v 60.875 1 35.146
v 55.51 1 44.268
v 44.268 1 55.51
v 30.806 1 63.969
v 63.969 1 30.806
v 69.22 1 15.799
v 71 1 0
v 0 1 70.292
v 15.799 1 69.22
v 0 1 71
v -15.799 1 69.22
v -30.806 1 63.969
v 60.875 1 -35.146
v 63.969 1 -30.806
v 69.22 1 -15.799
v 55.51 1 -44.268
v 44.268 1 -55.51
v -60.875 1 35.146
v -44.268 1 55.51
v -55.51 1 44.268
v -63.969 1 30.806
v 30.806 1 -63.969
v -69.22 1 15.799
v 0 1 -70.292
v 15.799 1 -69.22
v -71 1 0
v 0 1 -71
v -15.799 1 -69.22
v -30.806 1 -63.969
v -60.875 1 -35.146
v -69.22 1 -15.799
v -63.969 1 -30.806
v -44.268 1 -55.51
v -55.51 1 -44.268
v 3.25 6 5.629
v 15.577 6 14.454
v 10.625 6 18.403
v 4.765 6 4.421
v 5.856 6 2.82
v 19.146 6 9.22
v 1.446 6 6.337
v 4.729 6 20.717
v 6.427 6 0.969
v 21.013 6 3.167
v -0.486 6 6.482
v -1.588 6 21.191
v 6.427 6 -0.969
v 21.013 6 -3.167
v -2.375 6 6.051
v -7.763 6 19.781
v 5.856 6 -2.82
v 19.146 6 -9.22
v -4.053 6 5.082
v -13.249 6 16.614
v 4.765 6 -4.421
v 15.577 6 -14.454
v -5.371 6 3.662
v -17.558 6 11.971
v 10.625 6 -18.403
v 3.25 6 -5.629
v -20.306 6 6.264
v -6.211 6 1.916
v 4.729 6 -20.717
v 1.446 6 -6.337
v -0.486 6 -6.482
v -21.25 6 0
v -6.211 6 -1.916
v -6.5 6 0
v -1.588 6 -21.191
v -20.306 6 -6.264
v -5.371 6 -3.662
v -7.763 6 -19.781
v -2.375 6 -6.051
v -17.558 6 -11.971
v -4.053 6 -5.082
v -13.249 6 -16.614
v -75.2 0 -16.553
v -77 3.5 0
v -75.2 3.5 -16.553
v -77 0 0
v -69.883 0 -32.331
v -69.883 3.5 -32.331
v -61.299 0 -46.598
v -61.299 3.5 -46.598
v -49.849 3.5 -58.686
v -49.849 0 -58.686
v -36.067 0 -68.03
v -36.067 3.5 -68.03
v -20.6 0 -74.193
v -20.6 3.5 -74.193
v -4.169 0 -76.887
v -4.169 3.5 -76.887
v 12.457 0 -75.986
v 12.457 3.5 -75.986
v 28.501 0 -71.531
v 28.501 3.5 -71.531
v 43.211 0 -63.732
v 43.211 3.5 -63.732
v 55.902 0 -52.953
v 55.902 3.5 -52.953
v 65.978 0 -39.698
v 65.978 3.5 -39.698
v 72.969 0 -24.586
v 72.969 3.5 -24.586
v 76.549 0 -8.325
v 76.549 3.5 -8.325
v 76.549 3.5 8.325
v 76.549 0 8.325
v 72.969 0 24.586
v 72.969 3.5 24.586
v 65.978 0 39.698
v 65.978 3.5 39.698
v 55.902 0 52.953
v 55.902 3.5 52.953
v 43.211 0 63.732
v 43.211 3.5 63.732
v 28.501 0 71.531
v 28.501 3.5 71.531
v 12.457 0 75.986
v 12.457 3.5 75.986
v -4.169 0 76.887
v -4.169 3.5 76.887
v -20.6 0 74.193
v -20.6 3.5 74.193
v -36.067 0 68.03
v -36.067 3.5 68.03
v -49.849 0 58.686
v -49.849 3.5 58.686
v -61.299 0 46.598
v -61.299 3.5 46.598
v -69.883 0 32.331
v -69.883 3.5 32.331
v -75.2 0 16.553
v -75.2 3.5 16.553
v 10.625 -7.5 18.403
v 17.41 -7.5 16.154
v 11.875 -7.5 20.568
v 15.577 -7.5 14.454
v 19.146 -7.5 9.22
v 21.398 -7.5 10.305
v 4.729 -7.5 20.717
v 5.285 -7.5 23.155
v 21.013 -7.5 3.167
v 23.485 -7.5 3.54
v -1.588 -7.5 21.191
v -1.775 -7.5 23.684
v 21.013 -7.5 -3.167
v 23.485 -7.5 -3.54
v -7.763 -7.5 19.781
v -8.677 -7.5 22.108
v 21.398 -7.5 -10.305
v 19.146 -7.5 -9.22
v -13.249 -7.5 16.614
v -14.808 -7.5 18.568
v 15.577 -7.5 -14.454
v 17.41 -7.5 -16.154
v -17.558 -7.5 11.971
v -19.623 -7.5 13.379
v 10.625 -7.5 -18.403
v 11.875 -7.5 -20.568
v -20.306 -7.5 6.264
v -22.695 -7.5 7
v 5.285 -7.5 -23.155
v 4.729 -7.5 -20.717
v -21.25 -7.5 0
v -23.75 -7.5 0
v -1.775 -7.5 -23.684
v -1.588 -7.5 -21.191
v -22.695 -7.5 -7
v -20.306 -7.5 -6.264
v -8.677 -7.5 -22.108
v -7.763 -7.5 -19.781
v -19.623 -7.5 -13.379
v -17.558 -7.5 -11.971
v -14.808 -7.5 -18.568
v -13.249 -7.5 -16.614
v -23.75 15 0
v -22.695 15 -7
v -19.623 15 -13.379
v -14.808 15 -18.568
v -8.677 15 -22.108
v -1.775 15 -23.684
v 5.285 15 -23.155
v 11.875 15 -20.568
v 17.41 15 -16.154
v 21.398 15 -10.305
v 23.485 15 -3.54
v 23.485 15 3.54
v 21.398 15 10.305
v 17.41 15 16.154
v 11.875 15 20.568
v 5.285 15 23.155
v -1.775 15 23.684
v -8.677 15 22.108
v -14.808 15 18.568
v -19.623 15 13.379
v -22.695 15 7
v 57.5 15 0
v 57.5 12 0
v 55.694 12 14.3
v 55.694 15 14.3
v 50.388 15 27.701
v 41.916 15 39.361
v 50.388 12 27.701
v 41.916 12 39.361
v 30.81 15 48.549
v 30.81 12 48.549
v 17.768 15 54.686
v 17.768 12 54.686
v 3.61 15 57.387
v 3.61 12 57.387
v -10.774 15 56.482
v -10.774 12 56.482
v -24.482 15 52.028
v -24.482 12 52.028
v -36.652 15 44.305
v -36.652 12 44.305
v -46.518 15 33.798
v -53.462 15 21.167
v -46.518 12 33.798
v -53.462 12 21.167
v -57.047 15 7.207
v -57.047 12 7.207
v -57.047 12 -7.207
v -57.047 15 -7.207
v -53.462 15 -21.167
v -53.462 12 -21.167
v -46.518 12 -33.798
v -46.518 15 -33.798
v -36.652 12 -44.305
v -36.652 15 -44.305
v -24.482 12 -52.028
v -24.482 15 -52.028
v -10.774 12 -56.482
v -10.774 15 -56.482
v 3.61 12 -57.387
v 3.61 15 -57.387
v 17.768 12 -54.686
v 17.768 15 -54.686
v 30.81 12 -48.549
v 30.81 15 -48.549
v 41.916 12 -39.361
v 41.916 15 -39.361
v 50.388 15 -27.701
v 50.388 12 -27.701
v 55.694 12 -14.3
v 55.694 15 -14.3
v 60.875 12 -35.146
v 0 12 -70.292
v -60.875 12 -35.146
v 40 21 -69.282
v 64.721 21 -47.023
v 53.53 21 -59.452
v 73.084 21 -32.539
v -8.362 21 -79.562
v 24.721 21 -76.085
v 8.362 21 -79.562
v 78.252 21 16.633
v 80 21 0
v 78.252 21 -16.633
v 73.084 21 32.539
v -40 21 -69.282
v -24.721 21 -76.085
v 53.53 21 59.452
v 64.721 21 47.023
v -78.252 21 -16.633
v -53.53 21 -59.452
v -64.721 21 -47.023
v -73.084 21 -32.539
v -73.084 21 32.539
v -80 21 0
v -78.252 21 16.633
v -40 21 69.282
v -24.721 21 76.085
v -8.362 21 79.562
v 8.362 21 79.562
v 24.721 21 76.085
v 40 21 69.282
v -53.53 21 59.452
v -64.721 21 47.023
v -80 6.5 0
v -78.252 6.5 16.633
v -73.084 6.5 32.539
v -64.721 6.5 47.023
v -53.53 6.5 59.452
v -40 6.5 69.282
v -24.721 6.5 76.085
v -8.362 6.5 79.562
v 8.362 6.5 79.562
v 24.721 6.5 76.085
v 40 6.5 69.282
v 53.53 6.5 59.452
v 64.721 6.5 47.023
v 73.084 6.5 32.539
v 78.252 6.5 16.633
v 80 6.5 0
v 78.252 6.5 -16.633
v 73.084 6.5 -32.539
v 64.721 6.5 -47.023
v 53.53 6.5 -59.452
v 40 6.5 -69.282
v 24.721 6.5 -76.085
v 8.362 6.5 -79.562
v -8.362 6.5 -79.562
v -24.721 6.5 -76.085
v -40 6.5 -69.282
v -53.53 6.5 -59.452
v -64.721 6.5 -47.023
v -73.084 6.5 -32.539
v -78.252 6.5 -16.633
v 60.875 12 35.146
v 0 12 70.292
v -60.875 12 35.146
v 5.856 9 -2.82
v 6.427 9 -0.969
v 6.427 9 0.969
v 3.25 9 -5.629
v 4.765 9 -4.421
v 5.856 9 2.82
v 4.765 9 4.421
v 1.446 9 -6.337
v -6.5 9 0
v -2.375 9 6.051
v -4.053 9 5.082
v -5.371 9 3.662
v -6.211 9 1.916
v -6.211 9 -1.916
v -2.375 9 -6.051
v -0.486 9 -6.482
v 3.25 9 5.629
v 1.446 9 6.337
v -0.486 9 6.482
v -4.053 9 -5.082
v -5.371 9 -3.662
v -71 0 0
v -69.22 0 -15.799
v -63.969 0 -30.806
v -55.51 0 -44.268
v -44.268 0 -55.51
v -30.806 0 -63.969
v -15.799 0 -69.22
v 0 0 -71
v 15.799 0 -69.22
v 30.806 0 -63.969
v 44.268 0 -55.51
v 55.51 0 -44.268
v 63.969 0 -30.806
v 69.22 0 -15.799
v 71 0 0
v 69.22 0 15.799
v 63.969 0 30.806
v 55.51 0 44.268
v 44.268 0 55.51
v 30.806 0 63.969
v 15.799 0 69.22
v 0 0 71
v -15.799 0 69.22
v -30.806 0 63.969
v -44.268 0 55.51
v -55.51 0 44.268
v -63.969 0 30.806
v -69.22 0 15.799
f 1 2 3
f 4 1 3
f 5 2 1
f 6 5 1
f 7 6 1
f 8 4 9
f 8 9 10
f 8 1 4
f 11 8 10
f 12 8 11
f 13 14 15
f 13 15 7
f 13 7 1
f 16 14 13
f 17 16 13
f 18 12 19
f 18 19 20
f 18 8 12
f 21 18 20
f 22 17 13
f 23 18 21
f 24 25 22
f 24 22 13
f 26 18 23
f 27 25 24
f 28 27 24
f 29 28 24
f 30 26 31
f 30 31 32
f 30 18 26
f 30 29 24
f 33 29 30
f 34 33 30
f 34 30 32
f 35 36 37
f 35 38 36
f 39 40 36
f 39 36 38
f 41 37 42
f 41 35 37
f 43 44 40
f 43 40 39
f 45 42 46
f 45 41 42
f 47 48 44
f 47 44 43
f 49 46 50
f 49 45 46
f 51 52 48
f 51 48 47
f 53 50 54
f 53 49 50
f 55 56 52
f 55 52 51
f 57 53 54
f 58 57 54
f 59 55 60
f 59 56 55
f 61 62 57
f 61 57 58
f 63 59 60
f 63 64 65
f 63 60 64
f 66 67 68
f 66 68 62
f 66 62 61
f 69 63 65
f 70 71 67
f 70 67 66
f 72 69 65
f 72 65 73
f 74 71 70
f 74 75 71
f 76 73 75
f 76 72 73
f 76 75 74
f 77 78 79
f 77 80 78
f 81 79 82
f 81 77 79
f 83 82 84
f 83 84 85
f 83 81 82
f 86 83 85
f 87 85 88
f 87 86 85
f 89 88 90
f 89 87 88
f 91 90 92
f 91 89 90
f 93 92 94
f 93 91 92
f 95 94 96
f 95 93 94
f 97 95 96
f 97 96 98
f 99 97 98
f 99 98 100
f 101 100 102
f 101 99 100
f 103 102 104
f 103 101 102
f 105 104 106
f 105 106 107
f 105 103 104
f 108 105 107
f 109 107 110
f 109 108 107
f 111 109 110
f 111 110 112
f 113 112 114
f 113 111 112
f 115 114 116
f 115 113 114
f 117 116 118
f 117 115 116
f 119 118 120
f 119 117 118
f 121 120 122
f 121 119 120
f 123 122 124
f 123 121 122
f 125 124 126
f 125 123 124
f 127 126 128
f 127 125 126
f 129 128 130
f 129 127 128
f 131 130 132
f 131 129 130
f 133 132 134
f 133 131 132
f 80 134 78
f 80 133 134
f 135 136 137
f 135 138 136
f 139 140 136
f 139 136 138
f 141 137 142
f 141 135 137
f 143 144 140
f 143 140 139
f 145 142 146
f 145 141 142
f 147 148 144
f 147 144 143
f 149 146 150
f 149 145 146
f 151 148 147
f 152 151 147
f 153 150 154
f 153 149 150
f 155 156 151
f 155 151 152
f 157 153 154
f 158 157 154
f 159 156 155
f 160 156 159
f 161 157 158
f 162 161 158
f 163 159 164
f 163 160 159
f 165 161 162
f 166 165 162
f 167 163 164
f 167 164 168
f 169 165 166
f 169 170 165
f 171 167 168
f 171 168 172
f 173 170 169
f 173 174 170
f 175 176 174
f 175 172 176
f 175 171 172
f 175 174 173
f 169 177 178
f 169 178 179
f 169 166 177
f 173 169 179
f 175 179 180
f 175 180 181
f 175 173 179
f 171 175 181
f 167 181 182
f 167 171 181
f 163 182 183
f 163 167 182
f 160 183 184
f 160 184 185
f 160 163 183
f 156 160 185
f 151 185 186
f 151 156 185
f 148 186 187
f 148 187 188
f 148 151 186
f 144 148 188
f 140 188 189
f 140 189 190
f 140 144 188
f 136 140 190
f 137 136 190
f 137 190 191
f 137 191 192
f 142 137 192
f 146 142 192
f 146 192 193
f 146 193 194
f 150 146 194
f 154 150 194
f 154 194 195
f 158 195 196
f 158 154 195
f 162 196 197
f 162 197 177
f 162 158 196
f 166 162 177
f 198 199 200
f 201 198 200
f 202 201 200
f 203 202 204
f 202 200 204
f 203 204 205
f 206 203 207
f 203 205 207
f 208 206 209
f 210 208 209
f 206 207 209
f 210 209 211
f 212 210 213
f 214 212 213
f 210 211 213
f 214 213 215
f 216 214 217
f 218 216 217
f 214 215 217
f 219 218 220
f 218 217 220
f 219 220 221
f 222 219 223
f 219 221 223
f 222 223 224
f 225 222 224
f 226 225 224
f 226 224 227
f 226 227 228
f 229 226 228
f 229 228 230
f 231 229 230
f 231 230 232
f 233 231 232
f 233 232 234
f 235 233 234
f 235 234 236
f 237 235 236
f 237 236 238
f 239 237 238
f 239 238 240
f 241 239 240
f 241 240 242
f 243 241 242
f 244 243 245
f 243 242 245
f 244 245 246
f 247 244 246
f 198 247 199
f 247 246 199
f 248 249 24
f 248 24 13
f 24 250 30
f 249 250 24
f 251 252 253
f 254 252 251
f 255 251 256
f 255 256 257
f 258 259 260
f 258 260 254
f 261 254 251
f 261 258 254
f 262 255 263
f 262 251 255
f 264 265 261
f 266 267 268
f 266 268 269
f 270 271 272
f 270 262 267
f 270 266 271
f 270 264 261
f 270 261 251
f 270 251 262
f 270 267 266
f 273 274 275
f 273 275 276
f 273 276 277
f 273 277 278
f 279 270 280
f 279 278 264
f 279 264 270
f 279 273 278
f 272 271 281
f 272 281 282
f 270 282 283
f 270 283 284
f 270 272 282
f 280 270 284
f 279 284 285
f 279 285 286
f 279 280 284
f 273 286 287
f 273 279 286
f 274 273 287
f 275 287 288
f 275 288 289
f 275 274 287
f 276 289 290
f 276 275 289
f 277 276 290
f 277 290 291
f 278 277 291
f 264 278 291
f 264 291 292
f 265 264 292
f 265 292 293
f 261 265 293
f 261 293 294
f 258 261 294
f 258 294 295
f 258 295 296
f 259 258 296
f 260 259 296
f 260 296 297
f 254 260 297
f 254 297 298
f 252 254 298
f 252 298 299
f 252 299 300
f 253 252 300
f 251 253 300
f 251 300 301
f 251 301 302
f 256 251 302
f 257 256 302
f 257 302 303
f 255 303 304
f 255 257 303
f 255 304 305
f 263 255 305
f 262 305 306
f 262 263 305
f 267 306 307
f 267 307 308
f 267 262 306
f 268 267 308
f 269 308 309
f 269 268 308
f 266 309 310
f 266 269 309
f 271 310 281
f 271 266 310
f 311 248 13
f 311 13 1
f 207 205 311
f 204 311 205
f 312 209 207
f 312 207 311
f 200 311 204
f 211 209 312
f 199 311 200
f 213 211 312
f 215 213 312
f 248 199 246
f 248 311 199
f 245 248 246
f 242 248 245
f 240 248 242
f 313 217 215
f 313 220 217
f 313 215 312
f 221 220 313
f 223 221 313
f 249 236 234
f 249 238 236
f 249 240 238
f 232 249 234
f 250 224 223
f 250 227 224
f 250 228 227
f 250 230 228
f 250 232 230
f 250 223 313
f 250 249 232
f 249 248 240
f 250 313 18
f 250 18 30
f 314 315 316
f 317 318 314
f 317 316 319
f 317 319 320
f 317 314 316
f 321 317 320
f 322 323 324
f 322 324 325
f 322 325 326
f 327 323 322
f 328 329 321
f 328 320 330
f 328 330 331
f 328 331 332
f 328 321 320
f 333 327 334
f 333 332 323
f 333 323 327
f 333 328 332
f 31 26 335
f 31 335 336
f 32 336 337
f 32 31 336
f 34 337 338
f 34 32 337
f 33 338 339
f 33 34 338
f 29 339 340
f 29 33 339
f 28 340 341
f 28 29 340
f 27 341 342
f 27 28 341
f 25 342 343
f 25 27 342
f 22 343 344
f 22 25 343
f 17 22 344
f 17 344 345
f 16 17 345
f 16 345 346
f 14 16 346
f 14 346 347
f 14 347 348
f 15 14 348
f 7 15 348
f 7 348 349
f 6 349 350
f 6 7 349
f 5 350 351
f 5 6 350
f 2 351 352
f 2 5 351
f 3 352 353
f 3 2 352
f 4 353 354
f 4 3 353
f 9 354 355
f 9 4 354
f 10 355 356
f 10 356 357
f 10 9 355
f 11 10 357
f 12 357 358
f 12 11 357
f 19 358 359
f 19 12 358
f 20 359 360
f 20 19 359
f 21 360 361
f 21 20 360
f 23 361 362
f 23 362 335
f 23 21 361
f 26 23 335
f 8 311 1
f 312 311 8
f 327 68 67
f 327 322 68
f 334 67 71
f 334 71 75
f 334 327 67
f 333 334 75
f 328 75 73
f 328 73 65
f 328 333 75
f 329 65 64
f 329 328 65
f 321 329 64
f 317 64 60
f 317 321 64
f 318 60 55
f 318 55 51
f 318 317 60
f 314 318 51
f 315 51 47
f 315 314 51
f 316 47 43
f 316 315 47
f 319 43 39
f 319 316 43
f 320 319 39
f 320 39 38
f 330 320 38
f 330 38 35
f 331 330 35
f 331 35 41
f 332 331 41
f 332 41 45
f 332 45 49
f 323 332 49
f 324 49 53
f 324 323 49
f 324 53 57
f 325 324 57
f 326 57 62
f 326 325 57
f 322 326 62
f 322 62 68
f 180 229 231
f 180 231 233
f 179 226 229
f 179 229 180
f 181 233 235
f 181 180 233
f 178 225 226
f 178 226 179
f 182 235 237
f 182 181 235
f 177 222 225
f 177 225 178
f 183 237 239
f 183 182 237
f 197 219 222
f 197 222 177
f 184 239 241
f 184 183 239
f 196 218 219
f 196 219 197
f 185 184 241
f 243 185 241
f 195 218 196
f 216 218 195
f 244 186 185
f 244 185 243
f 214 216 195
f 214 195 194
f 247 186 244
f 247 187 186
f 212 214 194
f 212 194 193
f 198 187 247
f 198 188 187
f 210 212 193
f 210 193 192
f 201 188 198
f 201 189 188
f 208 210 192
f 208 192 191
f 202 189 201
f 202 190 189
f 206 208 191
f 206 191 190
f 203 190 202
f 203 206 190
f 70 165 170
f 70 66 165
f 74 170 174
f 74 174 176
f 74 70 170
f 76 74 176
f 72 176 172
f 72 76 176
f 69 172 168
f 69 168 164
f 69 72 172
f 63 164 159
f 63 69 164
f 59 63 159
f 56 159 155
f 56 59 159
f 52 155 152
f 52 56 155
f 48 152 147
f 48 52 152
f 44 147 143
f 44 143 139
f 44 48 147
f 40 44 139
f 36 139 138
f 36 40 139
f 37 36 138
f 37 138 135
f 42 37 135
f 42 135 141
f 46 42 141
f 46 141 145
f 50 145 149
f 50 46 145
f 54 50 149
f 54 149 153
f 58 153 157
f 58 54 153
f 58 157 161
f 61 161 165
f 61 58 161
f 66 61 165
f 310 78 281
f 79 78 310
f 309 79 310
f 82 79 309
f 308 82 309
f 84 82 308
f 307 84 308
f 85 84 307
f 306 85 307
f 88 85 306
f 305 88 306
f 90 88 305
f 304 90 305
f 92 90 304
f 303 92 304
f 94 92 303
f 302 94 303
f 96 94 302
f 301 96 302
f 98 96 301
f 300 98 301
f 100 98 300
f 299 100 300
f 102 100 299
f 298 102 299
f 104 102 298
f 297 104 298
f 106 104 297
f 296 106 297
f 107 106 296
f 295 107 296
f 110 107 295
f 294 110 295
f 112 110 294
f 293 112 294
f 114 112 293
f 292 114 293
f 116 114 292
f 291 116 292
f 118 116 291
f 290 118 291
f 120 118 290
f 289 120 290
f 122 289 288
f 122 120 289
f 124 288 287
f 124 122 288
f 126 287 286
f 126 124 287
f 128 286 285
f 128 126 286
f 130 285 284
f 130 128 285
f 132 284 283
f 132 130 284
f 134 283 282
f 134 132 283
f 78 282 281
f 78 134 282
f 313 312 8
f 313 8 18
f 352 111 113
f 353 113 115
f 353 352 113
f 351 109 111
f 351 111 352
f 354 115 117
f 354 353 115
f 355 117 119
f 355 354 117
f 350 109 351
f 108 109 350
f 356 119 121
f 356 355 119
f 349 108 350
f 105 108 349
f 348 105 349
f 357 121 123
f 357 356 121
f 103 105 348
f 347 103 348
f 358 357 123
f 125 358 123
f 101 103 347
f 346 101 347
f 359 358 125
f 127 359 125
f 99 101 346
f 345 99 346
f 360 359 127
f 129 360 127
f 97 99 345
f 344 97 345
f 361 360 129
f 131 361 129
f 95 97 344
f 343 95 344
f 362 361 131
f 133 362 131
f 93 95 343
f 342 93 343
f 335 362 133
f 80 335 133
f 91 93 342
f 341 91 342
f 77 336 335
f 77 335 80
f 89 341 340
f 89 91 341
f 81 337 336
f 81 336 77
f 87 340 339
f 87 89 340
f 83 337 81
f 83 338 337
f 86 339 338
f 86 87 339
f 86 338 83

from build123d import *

# Parameters (mm, degrees)
SKETCH2_R            = 71
BOSS_EXTRUDE1_DEPTH  = 11
SKETCH12_R           = 57.5
SKETCH12_R_2         = 23.75
CUT_EXTRUDE8_DEPTH   = 1
CUT_EXTRUDE9_START   = -10
SKETCH10_R           = 85
SKETCH10_R_2         = 81
CUT_EXTRUDE9_DEPTH   = 10
SKETCH14_R           = 57.5
SKETCH14_R_2         = 23.75
BOSS_EXTRUDE2_DEPTH  = 1
SKETCH15_R           = 81
BOSS_EXTRUDE3_DEPTH  = 4
SKETCH16_R           = 57.5
SKETCH16_R_2         = 23.75
CUT_EXTRUDE11_DEPTH  = 2
SKETCH17_W           = 29
SKETCH17_H           = 10.11
SKETCH17_H_2         = 35.11
BOSS_EXTRUDE4_DEPTH  = 3
SKETCH19_R           = 80.970867582
BOSS_EXTRUDE5_DEPTH  = 2
BOSS_EXTRUDE6_START  = -3
SKETCH20_R           = 80.970867582
BOSS_EXTRUDE6_DEPTH  = 3
SKETCH21_W           = 29
SKETCH21_H           = 45.22
BOSS_EXTRUDE7_DEPTH  = 4
BOSS_EXTRUDE9_DEPTH  = 5
CUT_EXTRUDE12_START  = -5
SKETCH26_R           = 80.970867582
CUT_EXTRUDE12_DEPTH  = 5
BOSS_EXTRUDE10_START = -4
SKETCH27_R           = 80.970867582
BOSS_EXTRUDE10_DEPTH = 4
CUT_EXTRUDE15_REACH  = 120.043
SKETCH28_R           = 80.970867582
SKETCH28_R_2         = 80


with BuildPart() as part:
    # Sketch1 → Revolve1 (revolve)
    with BuildSketch(Plane.XY, mode=Mode.PRIVATE) as revolve1_sk:
        Polygon((0, 12), (0, 15), (85, 15), (85, 10.5), (84, 10.5), (77, 3.5), (77, 0), (71, 0), (71, 12), (23.75, 12), (23.75, -7.5), (21.25, -7.5), (21.25, 6), (6.5, 6), (6.5, 9), (0, 9), align=None)
    revolve(revolve1_sk.sketch.rotate(Axis((0, 12, 0), (0, -1, 0)), 180), axis=Axis((0, 12, 0), (0, -1, 0)))

    # Sketch2 → Boss-Extrude1 (add)
    with BuildSketch(Plane.XZ.offset(-12)):
        with Locations(Location((0, 0, 0), (0, 0, 180))):
            Circle(SKETCH2_R)
        Polygon((0, 70.292395274), (-60.875, 35.146197637), (-60.875, -35.146197637), (0, -70.292395274), (60.875, -35.146197637), (60.875, 35.146197637), align=None, mode=Mode.SUBTRACT)
    extrude(amount=BOSS_EXTRUDE1_DEPTH)

    # Sketch12 → Cut-Extrude8 (cut)
    with BuildSketch(Plane.XZ.offset(-12)):
        Circle(SKETCH12_R)
        with Locations(Location((0, 0, 0), (0, 0, 180))):
            Circle(SKETCH12_R_2, mode=Mode.SUBTRACT)
    extrude(amount=-CUT_EXTRUDE8_DEPTH, mode=Mode.SUBTRACT)

    # Sketch10 → Cut-Extrude9 (cut)
    with BuildSketch(Plane(origin=(0, 15, 0), x_dir=(1, 0, 0), z_dir=(0, 1, 0)).offset(CUT_EXTRUDE9_START)):
        Circle(SKETCH10_R)
        with Locations(Location((0, 0, 0), (0, 0, 180))):
            Circle(SKETCH10_R_2, mode=Mode.SUBTRACT)
    extrude(amount=CUT_EXTRUDE9_DEPTH, mode=Mode.SUBTRACT)

    # Sketch14 → Boss-Extrude2 (add)
    with BuildSketch(Plane(origin=(0, 13, 0), x_dir=(-1, 0, 0), z_dir=(0, -1, 0))):
        with Locations(Location((0, 0, 0), (0, 0, 180))):
            Circle(SKETCH14_R)
        Circle(SKETCH14_R_2, mode=Mode.SUBTRACT)
    extrude(amount=-BOSS_EXTRUDE2_DEPTH)

    # Sketch15 → Boss-Extrude3 (add)
    with BuildSketch(Plane(origin=(0, 15, 0), x_dir=(1, 0, 0), z_dir=(0, 1, 0))):
        with Locations(Location((0, 0, 0), (0, 0, 180))):
            Circle(SKETCH15_R)
    extrude(amount=BOSS_EXTRUDE3_DEPTH)

    # Sketch16 → Cut-Extrude11 (cut)
    with BuildSketch(Plane.XZ.offset(-13)):
        Circle(SKETCH16_R)
        with Locations(Location((0, 0, 0), (0, 0, 180))):
            Circle(SKETCH16_R_2, mode=Mode.SUBTRACT)
    extrude(amount=-CUT_EXTRUDE11_DEPTH, mode=Mode.SUBTRACT)

    # Sketch17 → Boss-Extrude4 (add)
    with BuildSketch(Plane(origin=(0, 19, 0), x_dir=(1, 0, 0), z_dir=(0, 1, 0))):
        with Locations((-48.833648901, -5.055)):
            Rectangle(SKETCH17_W, SKETCH17_H)
        with Locations((-48.833648901, 17.555)):
            Rectangle(SKETCH17_W, SKETCH17_H_2)
        with Locations((48.416351099, -5.055)):
            Rectangle(SKETCH17_W, SKETCH17_H)
        with Locations((48.416351099, 17.555)):
            Rectangle(SKETCH17_W, SKETCH17_H_2)
    extrude(amount=BOSS_EXTRUDE4_DEPTH)

    # Sketch19 → Boss-Extrude5 (add)
    with BuildSketch(Plane(origin=(0, 19, 0), x_dir=(1, 0, 0), z_dir=(0, 1, 0))):
        with Locations(Location((0, 0, 0), (0, 0, 180))):
            Circle(SKETCH19_R)
    extrude(amount=BOSS_EXTRUDE5_DEPTH)

    # Sketch20 → Boss-Extrude6 (add)
    with BuildSketch(Plane(origin=(0, 21, 0), x_dir=(1, 0, 0), z_dir=(0, 1, 0)).offset(BOSS_EXTRUDE6_START)):
        with Locations(Location((0, 0, 0), (0, 0, 180))):
            Circle(SKETCH20_R)
    extrude(amount=BOSS_EXTRUDE6_DEPTH)

    # Sketch21 → Boss-Extrude7 (add)
    with BuildSketch(Plane(origin=(0, 22, 0), x_dir=(1, 0, 0), z_dir=(0, 1, 0))):
        with Locations((48.416351099, 12.5)):
            Rectangle(SKETCH21_W, SKETCH21_H)
        with Locations((-48.833648901, 12.5)):
            Rectangle(SKETCH21_W, SKETCH21_H)
    extrude(amount=BOSS_EXTRUDE7_DEPTH)

    # Sketch22 → Boss-Extrude9 (add)
    with BuildSketch(Plane(origin=(0, 21, 0), x_dir=(1, 0, 0), z_dir=(0, 1, 0))):
        Polygon((48.416351099, 35.11), (37.416351099, 35.11), (37.416351099, 50.11), (59.416351099, 50.11), (59.416351099, 35.11), align=None)
    extrude(amount=BOSS_EXTRUDE9_DEPTH)

    # Sketch26 → Cut-Extrude12 (cut)
    with BuildSketch(Plane(origin=(0, 26, 0), x_dir=(1, 0, 0), z_dir=(0, 1, 0)).offset(CUT_EXTRUDE12_START)):
        with Locations(Location((0, 0, 0), (0, 0, 180))):
            Circle(SKETCH26_R)
    extrude(amount=CUT_EXTRUDE12_DEPTH, mode=Mode.SUBTRACT)

    # Sketch27 → Boss-Extrude10 (add)
    with BuildSketch(Plane(origin=(0, 21, 0), x_dir=(1, 0, 0), z_dir=(0, 1, 0)).offset(BOSS_EXTRUDE10_START)):
        with Locations(Location((0, 0, 0), (0, 0, 180))):
            Circle(SKETCH27_R)
    extrude(amount=BOSS_EXTRUDE10_DEPTH)

    # Cut-Extrude15: up to this cone (the profile starts inside it)
    cut_extrude15_end = Plane(origin=(0, 21, 0), z_dir=(0, 1, 0)).offset(-94.499999) * Cone(1e-06, 309.543, 309.542999, align=(Align.CENTER, Align.CENTER, Align.MIN), mode=Mode.PRIVATE)
    # Sketch28 → Cut-Extrude15 (cut, up to the surface)
    with BuildSketch(Plane(origin=(0, 21, 0), x_dir=(1, 0, 0), z_dir=(0, 1, 0)), mode=Mode.PRIVATE) as cut_extrude15_sk1:
        Circle(SKETCH28_R)
        with Locations(Location((0, 0, 0), (0, 0, 180))):
            Circle(SKETCH28_R_2, mode=Mode.SUBTRACT)
    cut_extrude15_tool1 = extrude(cut_extrude15_sk1.sketch, amount=-CUT_EXTRUDE15_REACH, mode=Mode.PRIVATE) & cut_extrude15_end
    add(cut_extrude15_tool1.solids().sort_by_distance((-80.741847, 21, 0))[0], mode=Mode.SUBTRACT)


with BuildPart() as body_2:
    # of the pieces the cut leaves, the one that is kept (cut_extrude15_keep)
    add(part.part.solids().sort_by_distance((-80, 6.5, 0))[0])


solid = body_2.part
